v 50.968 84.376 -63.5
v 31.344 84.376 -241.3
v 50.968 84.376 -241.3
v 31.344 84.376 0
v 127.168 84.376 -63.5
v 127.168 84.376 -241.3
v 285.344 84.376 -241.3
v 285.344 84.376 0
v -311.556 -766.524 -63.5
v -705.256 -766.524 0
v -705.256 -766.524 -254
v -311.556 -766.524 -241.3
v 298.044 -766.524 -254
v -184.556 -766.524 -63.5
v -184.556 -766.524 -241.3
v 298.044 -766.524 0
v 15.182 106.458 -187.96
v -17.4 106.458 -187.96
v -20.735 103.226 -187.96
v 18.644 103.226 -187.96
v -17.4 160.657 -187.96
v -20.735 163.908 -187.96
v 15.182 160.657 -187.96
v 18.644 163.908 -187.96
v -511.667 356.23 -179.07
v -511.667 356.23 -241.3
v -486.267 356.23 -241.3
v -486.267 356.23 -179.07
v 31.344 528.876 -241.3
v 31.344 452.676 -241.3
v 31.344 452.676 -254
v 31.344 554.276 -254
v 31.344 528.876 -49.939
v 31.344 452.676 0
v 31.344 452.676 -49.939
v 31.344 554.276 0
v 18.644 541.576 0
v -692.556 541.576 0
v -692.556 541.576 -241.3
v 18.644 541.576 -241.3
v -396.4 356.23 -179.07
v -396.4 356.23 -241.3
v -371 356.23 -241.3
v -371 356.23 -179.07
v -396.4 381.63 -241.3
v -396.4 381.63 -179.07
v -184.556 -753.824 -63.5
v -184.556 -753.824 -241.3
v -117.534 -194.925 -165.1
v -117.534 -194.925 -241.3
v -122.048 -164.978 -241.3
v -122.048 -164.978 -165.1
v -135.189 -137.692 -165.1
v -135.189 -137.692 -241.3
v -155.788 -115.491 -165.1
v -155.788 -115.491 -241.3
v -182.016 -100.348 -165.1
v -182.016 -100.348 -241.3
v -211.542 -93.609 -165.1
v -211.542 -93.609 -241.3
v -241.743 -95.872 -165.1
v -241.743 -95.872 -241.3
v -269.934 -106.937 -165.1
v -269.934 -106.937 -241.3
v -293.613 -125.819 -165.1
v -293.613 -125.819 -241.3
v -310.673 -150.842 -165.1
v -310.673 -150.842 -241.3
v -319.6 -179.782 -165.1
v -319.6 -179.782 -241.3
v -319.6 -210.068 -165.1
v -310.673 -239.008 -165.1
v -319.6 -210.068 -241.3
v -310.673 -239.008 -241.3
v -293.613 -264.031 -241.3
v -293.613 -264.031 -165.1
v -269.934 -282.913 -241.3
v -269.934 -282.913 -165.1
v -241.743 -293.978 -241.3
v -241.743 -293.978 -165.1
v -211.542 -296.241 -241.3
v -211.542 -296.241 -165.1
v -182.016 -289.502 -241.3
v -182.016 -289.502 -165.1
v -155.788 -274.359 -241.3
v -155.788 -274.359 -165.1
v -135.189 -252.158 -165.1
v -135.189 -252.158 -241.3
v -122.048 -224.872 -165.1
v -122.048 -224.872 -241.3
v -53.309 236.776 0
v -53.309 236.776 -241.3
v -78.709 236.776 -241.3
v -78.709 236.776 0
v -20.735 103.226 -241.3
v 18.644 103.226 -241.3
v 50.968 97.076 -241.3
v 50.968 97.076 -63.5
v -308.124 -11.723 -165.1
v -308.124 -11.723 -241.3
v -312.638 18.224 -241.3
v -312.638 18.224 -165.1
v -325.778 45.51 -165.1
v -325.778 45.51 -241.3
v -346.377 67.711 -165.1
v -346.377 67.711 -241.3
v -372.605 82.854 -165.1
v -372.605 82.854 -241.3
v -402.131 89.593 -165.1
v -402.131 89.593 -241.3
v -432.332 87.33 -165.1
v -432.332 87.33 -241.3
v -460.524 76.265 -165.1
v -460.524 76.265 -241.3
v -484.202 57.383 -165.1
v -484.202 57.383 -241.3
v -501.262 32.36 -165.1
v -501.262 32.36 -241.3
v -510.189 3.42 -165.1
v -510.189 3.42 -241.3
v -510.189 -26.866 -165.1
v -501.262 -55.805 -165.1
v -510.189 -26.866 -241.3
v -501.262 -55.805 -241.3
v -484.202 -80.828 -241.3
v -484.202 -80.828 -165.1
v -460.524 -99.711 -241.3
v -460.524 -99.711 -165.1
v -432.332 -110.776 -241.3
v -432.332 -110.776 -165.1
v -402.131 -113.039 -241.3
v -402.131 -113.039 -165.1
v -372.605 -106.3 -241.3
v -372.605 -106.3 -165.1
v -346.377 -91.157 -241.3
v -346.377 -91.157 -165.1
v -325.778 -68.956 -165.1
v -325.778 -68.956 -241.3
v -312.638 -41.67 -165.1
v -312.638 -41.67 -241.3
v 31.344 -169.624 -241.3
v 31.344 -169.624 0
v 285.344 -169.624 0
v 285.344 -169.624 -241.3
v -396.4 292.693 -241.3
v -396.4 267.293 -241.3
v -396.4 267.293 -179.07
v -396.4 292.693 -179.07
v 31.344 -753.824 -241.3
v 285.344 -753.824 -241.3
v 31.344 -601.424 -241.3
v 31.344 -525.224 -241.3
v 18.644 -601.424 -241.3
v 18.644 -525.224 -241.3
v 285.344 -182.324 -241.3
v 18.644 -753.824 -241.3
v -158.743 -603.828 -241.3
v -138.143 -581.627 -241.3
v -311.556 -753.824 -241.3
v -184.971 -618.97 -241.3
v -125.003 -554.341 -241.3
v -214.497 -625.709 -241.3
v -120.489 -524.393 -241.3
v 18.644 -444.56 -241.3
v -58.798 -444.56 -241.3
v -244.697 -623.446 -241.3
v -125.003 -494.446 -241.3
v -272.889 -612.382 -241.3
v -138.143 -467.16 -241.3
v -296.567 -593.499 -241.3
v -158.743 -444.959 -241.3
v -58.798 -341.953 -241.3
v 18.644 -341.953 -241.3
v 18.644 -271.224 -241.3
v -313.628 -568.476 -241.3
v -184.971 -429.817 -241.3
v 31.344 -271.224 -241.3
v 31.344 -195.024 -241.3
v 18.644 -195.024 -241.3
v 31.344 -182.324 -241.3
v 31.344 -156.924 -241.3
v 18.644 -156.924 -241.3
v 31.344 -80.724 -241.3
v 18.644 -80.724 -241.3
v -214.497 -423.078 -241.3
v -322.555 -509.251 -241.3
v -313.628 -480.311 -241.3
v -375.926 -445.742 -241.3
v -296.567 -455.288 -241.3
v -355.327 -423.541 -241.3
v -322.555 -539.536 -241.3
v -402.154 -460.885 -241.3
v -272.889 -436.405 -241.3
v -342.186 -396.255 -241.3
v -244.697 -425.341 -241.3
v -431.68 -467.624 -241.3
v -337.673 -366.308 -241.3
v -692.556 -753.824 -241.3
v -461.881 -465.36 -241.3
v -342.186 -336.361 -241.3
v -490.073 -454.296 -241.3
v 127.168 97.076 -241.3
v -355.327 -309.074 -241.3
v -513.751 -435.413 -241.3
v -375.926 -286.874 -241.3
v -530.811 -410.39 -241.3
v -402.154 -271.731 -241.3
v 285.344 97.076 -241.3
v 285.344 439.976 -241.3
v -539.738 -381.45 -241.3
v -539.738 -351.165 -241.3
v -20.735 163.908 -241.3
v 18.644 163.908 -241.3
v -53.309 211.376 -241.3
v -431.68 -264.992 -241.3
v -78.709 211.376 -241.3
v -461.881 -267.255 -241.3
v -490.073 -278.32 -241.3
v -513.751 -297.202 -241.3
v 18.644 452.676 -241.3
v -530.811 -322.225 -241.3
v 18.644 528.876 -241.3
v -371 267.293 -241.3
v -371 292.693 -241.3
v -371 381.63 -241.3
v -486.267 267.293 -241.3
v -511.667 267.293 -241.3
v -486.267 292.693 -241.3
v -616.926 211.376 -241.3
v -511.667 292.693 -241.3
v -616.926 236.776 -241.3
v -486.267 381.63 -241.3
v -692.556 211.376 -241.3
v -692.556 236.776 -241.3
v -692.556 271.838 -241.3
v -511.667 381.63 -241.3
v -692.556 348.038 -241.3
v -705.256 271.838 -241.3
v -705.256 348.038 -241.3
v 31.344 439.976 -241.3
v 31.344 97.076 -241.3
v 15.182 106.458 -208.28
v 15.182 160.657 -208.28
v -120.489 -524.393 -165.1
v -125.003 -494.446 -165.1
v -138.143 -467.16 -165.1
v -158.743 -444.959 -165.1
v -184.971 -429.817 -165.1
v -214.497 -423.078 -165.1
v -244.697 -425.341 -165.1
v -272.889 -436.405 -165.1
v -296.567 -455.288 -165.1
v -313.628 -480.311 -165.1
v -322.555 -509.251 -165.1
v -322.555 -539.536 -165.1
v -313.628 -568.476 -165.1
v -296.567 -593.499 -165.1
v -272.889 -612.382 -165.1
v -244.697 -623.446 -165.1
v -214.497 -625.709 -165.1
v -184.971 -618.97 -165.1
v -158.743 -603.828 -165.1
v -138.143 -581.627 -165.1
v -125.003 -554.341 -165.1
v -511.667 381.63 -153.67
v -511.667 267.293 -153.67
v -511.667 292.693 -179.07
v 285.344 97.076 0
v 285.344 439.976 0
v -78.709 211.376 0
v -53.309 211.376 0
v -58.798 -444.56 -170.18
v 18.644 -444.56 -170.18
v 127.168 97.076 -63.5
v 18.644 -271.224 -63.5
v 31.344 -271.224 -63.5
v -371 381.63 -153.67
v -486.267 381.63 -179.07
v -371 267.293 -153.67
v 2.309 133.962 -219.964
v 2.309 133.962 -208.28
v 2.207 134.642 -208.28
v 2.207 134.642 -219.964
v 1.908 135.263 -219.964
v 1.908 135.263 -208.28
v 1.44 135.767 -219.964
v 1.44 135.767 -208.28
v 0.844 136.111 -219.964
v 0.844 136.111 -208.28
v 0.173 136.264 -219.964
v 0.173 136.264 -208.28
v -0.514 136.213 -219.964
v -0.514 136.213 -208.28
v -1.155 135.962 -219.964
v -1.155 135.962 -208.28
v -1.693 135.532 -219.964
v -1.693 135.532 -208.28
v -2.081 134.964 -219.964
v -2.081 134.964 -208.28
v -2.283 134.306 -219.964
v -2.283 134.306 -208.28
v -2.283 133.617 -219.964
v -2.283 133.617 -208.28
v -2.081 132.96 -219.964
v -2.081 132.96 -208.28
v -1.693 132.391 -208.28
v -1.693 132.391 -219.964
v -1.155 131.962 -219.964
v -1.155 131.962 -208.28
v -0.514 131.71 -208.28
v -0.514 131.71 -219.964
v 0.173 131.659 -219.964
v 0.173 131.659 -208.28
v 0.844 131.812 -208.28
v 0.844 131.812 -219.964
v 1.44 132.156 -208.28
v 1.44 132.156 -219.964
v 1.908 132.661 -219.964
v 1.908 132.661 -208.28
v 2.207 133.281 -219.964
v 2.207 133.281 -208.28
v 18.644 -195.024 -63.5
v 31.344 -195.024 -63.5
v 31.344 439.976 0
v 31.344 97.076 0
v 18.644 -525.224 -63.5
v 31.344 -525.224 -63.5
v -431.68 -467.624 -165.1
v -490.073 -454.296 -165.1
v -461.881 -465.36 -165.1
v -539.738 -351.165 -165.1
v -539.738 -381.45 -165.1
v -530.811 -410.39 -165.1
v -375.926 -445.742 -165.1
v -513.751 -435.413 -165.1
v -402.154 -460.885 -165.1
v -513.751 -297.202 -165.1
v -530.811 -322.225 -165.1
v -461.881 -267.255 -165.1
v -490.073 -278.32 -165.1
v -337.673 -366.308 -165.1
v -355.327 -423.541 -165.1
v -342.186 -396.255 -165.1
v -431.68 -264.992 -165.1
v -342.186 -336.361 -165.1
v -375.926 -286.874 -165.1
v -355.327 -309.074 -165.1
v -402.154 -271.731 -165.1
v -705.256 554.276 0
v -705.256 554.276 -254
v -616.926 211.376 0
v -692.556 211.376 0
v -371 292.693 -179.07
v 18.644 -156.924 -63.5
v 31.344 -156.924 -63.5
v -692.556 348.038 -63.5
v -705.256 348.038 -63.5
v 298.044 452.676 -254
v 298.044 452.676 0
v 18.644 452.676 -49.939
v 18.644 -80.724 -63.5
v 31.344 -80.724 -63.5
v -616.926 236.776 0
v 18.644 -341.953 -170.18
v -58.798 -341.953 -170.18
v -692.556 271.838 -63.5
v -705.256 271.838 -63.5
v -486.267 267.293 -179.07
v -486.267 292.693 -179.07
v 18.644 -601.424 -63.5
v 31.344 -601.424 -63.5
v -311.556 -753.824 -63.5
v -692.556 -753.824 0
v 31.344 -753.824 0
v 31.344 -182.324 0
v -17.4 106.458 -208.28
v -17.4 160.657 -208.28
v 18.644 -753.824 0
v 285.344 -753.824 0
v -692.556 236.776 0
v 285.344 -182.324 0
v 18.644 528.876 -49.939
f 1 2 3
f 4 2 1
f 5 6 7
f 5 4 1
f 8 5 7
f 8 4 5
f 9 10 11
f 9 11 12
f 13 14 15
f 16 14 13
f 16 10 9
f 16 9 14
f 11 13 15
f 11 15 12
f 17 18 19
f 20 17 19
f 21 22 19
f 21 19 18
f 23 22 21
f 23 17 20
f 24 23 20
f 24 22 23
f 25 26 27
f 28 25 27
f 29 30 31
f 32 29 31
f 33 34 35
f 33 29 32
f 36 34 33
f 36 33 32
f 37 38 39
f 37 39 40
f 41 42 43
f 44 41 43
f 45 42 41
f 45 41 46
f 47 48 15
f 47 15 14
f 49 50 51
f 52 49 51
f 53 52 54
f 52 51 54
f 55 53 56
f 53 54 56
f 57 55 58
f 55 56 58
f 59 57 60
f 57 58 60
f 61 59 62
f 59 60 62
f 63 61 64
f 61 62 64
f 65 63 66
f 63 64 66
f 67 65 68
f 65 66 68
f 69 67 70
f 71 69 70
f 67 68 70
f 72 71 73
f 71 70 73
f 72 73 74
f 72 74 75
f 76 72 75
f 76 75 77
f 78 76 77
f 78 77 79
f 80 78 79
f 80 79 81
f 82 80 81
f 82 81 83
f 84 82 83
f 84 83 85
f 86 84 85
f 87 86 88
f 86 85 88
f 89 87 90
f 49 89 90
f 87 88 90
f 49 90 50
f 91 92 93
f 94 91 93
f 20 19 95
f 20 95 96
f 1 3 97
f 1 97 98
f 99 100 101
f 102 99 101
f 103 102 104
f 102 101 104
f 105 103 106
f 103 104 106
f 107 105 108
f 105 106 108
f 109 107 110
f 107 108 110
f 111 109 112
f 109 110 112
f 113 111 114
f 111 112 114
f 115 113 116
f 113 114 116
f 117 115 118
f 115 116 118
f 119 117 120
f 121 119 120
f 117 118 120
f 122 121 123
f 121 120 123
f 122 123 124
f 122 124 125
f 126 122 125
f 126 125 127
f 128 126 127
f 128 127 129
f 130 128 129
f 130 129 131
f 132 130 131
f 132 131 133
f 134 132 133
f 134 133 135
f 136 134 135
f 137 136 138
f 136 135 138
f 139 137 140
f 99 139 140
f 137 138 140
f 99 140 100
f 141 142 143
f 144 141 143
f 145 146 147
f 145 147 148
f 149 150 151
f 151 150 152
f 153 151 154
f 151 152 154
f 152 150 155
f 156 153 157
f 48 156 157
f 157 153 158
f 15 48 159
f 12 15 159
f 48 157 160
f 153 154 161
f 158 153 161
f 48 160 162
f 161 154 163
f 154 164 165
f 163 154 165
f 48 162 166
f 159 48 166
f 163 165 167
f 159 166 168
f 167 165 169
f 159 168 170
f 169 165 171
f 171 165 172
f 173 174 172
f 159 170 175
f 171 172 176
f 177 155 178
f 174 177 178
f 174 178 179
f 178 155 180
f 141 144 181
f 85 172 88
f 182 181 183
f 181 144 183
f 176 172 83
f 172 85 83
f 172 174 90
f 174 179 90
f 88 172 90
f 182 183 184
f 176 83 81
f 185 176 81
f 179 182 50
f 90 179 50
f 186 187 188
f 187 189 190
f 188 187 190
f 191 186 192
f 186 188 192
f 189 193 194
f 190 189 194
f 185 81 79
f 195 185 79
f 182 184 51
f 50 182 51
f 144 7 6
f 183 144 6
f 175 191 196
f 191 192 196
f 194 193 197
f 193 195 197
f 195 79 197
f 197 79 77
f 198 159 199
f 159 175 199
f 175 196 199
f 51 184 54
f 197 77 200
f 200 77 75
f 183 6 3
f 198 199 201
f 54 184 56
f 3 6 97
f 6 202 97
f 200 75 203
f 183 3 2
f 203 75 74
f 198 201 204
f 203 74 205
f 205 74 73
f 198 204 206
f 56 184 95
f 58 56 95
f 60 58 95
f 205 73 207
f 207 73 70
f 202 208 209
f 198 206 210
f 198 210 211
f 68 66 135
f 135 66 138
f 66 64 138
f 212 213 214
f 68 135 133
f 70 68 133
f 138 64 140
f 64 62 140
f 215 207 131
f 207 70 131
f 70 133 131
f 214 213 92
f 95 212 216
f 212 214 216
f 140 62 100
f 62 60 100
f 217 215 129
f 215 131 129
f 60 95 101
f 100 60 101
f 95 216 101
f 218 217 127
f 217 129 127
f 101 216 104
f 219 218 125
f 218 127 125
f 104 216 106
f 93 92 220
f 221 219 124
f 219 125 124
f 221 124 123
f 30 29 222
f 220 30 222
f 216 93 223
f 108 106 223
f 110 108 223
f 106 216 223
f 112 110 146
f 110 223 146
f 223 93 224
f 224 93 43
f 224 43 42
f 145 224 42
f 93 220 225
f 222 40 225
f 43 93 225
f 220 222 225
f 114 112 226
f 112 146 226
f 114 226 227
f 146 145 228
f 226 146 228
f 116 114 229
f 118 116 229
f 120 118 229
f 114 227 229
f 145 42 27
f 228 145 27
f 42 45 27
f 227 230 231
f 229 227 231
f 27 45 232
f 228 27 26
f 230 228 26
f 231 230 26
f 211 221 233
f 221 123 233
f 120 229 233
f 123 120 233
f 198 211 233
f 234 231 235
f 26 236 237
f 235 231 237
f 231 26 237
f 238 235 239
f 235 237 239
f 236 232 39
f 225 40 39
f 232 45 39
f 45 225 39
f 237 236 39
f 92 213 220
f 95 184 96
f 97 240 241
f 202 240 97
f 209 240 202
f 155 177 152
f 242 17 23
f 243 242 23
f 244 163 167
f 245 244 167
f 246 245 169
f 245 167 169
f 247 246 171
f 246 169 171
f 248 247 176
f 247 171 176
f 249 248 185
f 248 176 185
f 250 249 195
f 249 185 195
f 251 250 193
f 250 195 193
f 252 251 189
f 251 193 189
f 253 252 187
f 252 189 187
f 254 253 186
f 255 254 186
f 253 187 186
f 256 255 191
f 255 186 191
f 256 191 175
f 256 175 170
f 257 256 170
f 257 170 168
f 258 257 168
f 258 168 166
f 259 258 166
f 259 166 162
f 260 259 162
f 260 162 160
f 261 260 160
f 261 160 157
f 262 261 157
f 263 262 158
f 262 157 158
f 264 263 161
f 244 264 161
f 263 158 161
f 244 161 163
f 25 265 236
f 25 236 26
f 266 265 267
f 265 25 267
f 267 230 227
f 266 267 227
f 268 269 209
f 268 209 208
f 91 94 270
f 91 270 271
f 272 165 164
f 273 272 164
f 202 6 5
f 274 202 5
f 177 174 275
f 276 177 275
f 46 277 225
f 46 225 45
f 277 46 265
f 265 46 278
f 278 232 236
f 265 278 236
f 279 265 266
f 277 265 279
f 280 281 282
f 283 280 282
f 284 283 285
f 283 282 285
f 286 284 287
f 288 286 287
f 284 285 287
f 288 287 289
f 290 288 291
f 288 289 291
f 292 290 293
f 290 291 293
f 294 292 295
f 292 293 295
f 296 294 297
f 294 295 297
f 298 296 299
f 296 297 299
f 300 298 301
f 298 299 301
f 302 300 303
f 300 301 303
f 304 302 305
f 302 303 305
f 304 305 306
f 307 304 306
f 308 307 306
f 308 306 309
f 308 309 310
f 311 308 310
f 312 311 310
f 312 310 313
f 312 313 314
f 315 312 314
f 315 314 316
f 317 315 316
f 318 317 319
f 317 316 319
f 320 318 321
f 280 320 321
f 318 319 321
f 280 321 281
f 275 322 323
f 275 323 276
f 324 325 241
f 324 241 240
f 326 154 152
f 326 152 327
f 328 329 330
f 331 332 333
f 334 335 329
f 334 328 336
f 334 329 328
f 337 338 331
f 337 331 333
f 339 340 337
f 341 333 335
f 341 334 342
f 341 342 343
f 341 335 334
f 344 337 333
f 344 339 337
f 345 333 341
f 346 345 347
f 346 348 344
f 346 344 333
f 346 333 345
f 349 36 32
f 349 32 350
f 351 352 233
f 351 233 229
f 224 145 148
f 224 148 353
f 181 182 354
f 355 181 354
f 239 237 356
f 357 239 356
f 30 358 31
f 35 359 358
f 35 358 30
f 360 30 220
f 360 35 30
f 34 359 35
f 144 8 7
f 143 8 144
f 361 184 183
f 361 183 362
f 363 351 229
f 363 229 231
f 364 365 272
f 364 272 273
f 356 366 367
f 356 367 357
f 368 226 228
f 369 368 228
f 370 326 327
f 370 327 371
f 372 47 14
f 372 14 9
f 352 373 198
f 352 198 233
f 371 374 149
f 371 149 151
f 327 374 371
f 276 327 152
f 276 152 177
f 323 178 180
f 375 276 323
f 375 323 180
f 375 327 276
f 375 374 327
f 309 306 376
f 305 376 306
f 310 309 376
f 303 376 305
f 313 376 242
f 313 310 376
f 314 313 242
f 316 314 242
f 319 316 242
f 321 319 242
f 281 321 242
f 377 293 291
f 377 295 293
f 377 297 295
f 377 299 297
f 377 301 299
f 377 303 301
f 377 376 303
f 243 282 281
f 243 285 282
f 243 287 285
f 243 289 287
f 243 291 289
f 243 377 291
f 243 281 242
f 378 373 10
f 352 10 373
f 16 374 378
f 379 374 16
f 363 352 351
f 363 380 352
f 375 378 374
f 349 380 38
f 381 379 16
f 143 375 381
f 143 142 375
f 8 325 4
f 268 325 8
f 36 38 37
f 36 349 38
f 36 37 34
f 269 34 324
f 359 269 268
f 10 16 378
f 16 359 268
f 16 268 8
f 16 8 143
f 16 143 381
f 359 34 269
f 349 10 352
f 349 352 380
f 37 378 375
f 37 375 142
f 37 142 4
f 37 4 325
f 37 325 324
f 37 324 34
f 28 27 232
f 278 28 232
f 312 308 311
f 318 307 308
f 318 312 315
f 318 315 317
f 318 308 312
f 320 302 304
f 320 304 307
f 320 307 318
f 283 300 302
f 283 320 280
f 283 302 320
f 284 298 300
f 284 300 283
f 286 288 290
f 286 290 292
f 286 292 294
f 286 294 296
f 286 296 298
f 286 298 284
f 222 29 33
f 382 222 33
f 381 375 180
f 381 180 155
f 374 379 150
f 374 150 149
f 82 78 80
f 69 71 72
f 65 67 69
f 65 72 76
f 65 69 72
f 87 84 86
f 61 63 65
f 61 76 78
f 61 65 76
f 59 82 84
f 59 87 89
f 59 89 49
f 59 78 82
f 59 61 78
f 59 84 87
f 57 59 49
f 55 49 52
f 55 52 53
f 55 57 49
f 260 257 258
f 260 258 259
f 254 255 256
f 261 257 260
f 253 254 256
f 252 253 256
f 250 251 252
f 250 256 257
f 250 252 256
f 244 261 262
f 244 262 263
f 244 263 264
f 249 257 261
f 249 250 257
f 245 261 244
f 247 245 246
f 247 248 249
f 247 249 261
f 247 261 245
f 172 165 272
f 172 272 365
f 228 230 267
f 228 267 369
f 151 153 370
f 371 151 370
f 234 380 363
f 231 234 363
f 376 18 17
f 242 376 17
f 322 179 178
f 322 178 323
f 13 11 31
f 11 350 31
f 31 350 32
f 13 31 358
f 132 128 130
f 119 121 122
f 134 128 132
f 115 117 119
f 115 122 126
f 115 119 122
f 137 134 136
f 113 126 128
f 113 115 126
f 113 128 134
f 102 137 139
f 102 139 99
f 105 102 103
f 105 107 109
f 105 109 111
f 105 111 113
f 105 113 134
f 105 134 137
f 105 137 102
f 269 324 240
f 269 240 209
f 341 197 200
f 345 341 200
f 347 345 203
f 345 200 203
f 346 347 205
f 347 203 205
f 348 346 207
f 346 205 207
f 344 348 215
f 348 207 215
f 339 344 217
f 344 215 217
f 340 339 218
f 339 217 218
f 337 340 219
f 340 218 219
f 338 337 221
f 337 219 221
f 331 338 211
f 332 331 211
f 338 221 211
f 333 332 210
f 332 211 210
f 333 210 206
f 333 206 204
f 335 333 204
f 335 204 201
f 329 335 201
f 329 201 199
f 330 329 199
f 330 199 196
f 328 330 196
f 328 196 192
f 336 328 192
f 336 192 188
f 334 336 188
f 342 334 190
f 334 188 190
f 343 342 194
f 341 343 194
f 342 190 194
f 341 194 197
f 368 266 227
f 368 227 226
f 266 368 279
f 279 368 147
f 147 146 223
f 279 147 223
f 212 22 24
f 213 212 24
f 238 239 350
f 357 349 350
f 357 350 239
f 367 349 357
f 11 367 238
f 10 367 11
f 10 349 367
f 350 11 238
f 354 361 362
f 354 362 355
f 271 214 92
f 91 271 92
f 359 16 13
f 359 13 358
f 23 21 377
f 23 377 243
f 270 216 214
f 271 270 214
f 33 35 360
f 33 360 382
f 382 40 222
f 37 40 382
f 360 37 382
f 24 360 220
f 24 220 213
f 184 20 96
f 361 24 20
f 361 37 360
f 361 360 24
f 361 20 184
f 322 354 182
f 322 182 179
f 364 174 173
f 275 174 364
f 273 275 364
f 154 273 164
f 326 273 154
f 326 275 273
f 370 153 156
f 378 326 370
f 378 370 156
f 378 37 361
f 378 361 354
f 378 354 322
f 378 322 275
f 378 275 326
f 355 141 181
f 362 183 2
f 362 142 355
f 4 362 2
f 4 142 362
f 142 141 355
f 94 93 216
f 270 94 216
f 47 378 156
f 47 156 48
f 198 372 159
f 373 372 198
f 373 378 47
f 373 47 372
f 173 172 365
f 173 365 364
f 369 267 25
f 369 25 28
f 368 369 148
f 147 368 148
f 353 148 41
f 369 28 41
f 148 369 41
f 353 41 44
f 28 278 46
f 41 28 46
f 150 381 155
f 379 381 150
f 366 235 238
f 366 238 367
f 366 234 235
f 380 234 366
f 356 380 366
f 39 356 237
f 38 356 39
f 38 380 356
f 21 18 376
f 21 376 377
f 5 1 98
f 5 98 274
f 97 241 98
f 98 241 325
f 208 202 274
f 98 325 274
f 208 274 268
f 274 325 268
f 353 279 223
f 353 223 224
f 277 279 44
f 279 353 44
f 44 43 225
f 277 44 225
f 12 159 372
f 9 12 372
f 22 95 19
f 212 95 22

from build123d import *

# Parameters (mm, degrees)
F0_W      = 75.6297543388
F0_H      = 25.4
F0_W_2    = 254
F0_H_2    = 12.7
F1_DEPTH  = 254
F3_DEPTH  = 12.7
F4_R      = 101.6
F5_DEPTH  = 76.2
F6_W      = 76.2
F6_H      = 177.8
F7_DEPTH  = 25.4
F8_W      = 127
F8_H      = 177.8
F9_DEPTH  = 25.4
F10_W     = 76.2
F10_H     = 177.8
F11_DEPTH = 25.4
F12_W     = 76.2
F12_H     = 177.8
F13_DEPTH = 25.4
F14_W     = 76.2
F14_H     = 191.3614441931
F15_DEPTH = 25.4
F17_DEPTH = 241.3
F18_W     = 25.4
F18_H     = 25.4
F19_DEPTH = 62.23
F20_DEPTH = 25.4
F21_W     = 25.4
F21_H     = 25.4
F22_DEPTH = 25.4
F23_W     = 77.4427120167
F23_H     = 102.6062965393
F24_DEPTH = 71.12
F25_W     = 39.3790647912
F25_H     = 60.6827586889
F26_DEPTH = 53.34
F27_W     = 32.5816385448
F27_H     = 54.1992932558
F28_DEPTH = 20.32
F29_R     = 2.3092601705
F30_DEPTH = 11.684


with BuildPart() as f1:
    # F0 (on Top) → F1 (new body)
    with BuildSketch(Plane.XY):
        Polygon((-705.2555303436, -766.5243874192), (-578.2555303436, -766.5243874192), (31.3444696564, -766.5243874192), (31.3444696564, -753.8243874192), (31.3444696564, -639.5243874192), (31.3444696564, -182.3243874192), (31.3444696564, -169.6243874192), (31.3444696564, 84.3756125808), (31.3444696564, 97.0756125808), (31.3444696564, 439.9756125808), (31.3444696564, 452.6756125808), (31.3444696564, 554.2756125808), (-578.2555303436, 554.2756125808), (-705.2555303436, 554.2756125808), (-705.2555303436, -639.5243874192), align=None)
        Polygon((-692.5555303436, 236.7756125808), (-692.5555303436, 541.5756125808), (18.6444696564, 541.5756125808), (18.6444696564, -753.8243874192), (-692.5555303436, -753.8243874192), (-692.5555303436, 211.3756125808), align=None, mode=Mode.SUBTRACT)
        Polygon((31.3444696564, -753.8243874192), (31.3444696564, -766.5243874192), (298.0444696564, -766.5243874192), (298.0444696564, 452.6756125808), (31.3444696564, 452.6756125808), (31.3444696564, 439.9756125808), (285.3444696564, 439.9756125808), (285.3444696564, 97.0756125808), (285.3444696564, 84.3756125808), (285.3444696564, -169.6243874192), (285.3444696564, -182.3243874192), (285.3444696564, -753.8243874192), align=None)
        with Locations((-654.7406531742, 224.0756125808)):
            Rectangle(F0_W, F0_H)
        with Locations((158.3444696564, -175.9743874192)):
            Rectangle(F0_W_2, F0_H_2)
        with Locations((158.3444696564, 90.7256125808)):
            Rectangle(F0_W_2, F0_H_2)
    extrude(amount=-F1_DEPTH)

    # F2 (on face) → F3 (join)
    with BuildSketch(Plane(origin=(0, 0, -254), x_dir=(1, 0, 0), z_dir=(0, 0, -1))):
        Polygon((-705.2555303436, -554.2756125808), (-692.5555303436, -554.2756125808), (31.3444696564, -554.2756125808), (31.3444696564, -452.6756125808), (298.0444696564, -452.6756125808), (298.0444696564, 766.5243874192), (-705.2555303436, 766.5243874192), align=None)
    extrude(amount=-F3_DEPTH)

    # F4 (on face) → F5 (join)
    with BuildSketch(Plane.XY.offset(-241.3)):
        with Locations((-409.7238771986, -11.7228467155)):
            Circle(F4_R)
        with Locations((-219.1344722543, -194.9250362249)):
            Circle(F4_R)
        with Locations((-439.272572652, -366.3077359129)):
            Circle(F4_R)
        with Locations((-222.0893417996, -524.3934827381)):
            Circle(F4_R)
    extrude(amount=F5_DEPTH)

    # F6 (on face) → F7 (cut)
    with BuildSketch(Plane.YZ.offset(-692.5555303436)):
        with Locations((309.93842659, -152.4)):
            Rectangle(F6_W, F6_H)
    extrude(amount=-F7_DEPTH, mode=Mode.SUBTRACT)

    # F8 (on face) → F9 (cut)
    with BuildSketch(Plane(origin=(0, -753.8243874192, 0), x_dir=(-1, 0, 0), z_dir=(0, 1, 0))):
        with Locations((248.0555303436, -152.4)):
            Rectangle(F8_W, F8_H)
    extrude(amount=-F9_DEPTH, mode=Mode.SUBTRACT)

    # F10 (on face) → F11 (cut)
    with BuildSketch(Plane(origin=(18.6444696564, 0, 0), x_dir=(0, -1, 0), z_dir=(-1, 0, 0))):
        with Locations((233.1243874192, -152.4)):
            Rectangle(F10_W, F10_H)
        with Locations((563.3243874192, -152.4)):
            Rectangle(F10_W, F10_H)
        with Locations((118.8243874192, -152.4)):
            Rectangle(F10_W, F10_H)
    extrude(amount=-F11_DEPTH, mode=Mode.SUBTRACT)

    # F12 (on face) → F13 (cut)
    with BuildSketch(Plane.XZ.offset(-84.3756125808)):
        with Locations((89.0679913521, -152.4)):
            Rectangle(F12_W, F12_H)
    extrude(amount=-F13_DEPTH, mode=Mode.SUBTRACT)

    # F14 (on face) → F15 (cut)
    with BuildSketch(Plane.YZ.offset(31.3444696564)):
        with Locations((490.7756125808, -145.6192779034)):
            Rectangle(F14_W, F14_H)
    extrude(amount=-F15_DEPTH, mode=Mode.SUBTRACT)

    # F16 (on face) → F17 (join)
    with BuildSketch(Plane.XY.offset(-241.3)):
        Polygon((-53.3087753415, 236.7756125808), (-78.7087753415, 236.7756125808), (-78.7087753415, 211.3756125808), (-61.1483082175, 211.3756125808), (-53.3087753415, 211.3756125808), align=None)
    extrude(amount=F17_DEPTH)

    # F18 (on face) → F19 (join)
    with BuildSketch(Plane.XY.offset(-241.3)):
        with Locations((-498.9669535637, 368.9300801277)):
            Rectangle(F18_W, F18_H)
        with Locations((-498.9669535637, 279.9933936119)):
            Rectangle(F18_W, F18_H)
        with Locations((-383.7003324509, 279.9933936119)):
            Rectangle(F18_W, F18_H)
        with Locations((-383.7003324509, 368.9300801277)):
            Rectangle(F18_W, F18_H)
    extrude(amount=F19_DEPTH)

    # F18 (on face) → F20 (join)
    with BuildSketch(Plane.XY.offset(-241.3)):
        with Locations((-498.9669535637, 368.9300801277)):
            Rectangle(F18_W, F18_H)
        with Locations((-498.9669535637, 279.9933936119)):
            Rectangle(F18_W, F18_H)
        with Locations((-383.7003324509, 279.9933936119)):
            Rectangle(F18_W, F18_H)
        with Locations((-383.7003324509, 368.9300801277)):
            Rectangle(F18_W, F18_H)
    extrude(amount=F20_DEPTH)

    # F21 (on face) → F22 (join)
    with BuildSketch(Plane.XY.offset(-179.07)):
        with Locations((-498.9669535637, 368.9300801277)):
            Rectangle(F21_W, F21_H)
        Polygon((-486.2669535637, 356.2300801277), (-511.6669535637, 356.2300801277), (-511.6669535637, 267.2933936119), (-396.4003324509, 267.2933936119), (-396.4003324509, 292.6933936119), (-371.0003324509, 292.6933936119), (-371.0003324509, 381.6300801277), (-486.2669535637, 381.6300801277), align=None)
        with Locations((-383.7003324509, 279.9933936119)):
            Rectangle(F21_W, F21_H)
    extrude(amount=F22_DEPTH)

    # F23 (on face) → F24 (join)
    with BuildSketch(Plane.XY.offset(-241.3)):
        with Locations((-20.076886352, -393.2565152645)):
            Rectangle(F23_W, F23_H)
    extrude(amount=F24_DEPTH)

    # F25 (on face) → F26 (join)
    with BuildSketch(Plane.XY.offset(-241.3)):
        with Locations((-1.0450627392, 133.5669532418)):
            Rectangle(F25_W, F25_H)
    extrude(amount=F26_DEPTH)

    # F27 (on face) → F28 (cut)
    with BuildSketch(Plane.XY.offset(-187.96)):
        with Locations((-1.1091437191, 133.5575208068)):
            Rectangle(F27_W, F27_H)
    extrude(amount=-F28_DEPTH, mode=Mode.SUBTRACT)

    # F29 (on face) → F30 (cut)
    with BuildSketch(Plane.XY.offset(-208.28)):
        with Locations((0, 133.9616626501)):
            Circle(F29_R)
    extrude(amount=-F30_DEPTH, mode=Mode.SUBTRACT)


solid = f1.part
